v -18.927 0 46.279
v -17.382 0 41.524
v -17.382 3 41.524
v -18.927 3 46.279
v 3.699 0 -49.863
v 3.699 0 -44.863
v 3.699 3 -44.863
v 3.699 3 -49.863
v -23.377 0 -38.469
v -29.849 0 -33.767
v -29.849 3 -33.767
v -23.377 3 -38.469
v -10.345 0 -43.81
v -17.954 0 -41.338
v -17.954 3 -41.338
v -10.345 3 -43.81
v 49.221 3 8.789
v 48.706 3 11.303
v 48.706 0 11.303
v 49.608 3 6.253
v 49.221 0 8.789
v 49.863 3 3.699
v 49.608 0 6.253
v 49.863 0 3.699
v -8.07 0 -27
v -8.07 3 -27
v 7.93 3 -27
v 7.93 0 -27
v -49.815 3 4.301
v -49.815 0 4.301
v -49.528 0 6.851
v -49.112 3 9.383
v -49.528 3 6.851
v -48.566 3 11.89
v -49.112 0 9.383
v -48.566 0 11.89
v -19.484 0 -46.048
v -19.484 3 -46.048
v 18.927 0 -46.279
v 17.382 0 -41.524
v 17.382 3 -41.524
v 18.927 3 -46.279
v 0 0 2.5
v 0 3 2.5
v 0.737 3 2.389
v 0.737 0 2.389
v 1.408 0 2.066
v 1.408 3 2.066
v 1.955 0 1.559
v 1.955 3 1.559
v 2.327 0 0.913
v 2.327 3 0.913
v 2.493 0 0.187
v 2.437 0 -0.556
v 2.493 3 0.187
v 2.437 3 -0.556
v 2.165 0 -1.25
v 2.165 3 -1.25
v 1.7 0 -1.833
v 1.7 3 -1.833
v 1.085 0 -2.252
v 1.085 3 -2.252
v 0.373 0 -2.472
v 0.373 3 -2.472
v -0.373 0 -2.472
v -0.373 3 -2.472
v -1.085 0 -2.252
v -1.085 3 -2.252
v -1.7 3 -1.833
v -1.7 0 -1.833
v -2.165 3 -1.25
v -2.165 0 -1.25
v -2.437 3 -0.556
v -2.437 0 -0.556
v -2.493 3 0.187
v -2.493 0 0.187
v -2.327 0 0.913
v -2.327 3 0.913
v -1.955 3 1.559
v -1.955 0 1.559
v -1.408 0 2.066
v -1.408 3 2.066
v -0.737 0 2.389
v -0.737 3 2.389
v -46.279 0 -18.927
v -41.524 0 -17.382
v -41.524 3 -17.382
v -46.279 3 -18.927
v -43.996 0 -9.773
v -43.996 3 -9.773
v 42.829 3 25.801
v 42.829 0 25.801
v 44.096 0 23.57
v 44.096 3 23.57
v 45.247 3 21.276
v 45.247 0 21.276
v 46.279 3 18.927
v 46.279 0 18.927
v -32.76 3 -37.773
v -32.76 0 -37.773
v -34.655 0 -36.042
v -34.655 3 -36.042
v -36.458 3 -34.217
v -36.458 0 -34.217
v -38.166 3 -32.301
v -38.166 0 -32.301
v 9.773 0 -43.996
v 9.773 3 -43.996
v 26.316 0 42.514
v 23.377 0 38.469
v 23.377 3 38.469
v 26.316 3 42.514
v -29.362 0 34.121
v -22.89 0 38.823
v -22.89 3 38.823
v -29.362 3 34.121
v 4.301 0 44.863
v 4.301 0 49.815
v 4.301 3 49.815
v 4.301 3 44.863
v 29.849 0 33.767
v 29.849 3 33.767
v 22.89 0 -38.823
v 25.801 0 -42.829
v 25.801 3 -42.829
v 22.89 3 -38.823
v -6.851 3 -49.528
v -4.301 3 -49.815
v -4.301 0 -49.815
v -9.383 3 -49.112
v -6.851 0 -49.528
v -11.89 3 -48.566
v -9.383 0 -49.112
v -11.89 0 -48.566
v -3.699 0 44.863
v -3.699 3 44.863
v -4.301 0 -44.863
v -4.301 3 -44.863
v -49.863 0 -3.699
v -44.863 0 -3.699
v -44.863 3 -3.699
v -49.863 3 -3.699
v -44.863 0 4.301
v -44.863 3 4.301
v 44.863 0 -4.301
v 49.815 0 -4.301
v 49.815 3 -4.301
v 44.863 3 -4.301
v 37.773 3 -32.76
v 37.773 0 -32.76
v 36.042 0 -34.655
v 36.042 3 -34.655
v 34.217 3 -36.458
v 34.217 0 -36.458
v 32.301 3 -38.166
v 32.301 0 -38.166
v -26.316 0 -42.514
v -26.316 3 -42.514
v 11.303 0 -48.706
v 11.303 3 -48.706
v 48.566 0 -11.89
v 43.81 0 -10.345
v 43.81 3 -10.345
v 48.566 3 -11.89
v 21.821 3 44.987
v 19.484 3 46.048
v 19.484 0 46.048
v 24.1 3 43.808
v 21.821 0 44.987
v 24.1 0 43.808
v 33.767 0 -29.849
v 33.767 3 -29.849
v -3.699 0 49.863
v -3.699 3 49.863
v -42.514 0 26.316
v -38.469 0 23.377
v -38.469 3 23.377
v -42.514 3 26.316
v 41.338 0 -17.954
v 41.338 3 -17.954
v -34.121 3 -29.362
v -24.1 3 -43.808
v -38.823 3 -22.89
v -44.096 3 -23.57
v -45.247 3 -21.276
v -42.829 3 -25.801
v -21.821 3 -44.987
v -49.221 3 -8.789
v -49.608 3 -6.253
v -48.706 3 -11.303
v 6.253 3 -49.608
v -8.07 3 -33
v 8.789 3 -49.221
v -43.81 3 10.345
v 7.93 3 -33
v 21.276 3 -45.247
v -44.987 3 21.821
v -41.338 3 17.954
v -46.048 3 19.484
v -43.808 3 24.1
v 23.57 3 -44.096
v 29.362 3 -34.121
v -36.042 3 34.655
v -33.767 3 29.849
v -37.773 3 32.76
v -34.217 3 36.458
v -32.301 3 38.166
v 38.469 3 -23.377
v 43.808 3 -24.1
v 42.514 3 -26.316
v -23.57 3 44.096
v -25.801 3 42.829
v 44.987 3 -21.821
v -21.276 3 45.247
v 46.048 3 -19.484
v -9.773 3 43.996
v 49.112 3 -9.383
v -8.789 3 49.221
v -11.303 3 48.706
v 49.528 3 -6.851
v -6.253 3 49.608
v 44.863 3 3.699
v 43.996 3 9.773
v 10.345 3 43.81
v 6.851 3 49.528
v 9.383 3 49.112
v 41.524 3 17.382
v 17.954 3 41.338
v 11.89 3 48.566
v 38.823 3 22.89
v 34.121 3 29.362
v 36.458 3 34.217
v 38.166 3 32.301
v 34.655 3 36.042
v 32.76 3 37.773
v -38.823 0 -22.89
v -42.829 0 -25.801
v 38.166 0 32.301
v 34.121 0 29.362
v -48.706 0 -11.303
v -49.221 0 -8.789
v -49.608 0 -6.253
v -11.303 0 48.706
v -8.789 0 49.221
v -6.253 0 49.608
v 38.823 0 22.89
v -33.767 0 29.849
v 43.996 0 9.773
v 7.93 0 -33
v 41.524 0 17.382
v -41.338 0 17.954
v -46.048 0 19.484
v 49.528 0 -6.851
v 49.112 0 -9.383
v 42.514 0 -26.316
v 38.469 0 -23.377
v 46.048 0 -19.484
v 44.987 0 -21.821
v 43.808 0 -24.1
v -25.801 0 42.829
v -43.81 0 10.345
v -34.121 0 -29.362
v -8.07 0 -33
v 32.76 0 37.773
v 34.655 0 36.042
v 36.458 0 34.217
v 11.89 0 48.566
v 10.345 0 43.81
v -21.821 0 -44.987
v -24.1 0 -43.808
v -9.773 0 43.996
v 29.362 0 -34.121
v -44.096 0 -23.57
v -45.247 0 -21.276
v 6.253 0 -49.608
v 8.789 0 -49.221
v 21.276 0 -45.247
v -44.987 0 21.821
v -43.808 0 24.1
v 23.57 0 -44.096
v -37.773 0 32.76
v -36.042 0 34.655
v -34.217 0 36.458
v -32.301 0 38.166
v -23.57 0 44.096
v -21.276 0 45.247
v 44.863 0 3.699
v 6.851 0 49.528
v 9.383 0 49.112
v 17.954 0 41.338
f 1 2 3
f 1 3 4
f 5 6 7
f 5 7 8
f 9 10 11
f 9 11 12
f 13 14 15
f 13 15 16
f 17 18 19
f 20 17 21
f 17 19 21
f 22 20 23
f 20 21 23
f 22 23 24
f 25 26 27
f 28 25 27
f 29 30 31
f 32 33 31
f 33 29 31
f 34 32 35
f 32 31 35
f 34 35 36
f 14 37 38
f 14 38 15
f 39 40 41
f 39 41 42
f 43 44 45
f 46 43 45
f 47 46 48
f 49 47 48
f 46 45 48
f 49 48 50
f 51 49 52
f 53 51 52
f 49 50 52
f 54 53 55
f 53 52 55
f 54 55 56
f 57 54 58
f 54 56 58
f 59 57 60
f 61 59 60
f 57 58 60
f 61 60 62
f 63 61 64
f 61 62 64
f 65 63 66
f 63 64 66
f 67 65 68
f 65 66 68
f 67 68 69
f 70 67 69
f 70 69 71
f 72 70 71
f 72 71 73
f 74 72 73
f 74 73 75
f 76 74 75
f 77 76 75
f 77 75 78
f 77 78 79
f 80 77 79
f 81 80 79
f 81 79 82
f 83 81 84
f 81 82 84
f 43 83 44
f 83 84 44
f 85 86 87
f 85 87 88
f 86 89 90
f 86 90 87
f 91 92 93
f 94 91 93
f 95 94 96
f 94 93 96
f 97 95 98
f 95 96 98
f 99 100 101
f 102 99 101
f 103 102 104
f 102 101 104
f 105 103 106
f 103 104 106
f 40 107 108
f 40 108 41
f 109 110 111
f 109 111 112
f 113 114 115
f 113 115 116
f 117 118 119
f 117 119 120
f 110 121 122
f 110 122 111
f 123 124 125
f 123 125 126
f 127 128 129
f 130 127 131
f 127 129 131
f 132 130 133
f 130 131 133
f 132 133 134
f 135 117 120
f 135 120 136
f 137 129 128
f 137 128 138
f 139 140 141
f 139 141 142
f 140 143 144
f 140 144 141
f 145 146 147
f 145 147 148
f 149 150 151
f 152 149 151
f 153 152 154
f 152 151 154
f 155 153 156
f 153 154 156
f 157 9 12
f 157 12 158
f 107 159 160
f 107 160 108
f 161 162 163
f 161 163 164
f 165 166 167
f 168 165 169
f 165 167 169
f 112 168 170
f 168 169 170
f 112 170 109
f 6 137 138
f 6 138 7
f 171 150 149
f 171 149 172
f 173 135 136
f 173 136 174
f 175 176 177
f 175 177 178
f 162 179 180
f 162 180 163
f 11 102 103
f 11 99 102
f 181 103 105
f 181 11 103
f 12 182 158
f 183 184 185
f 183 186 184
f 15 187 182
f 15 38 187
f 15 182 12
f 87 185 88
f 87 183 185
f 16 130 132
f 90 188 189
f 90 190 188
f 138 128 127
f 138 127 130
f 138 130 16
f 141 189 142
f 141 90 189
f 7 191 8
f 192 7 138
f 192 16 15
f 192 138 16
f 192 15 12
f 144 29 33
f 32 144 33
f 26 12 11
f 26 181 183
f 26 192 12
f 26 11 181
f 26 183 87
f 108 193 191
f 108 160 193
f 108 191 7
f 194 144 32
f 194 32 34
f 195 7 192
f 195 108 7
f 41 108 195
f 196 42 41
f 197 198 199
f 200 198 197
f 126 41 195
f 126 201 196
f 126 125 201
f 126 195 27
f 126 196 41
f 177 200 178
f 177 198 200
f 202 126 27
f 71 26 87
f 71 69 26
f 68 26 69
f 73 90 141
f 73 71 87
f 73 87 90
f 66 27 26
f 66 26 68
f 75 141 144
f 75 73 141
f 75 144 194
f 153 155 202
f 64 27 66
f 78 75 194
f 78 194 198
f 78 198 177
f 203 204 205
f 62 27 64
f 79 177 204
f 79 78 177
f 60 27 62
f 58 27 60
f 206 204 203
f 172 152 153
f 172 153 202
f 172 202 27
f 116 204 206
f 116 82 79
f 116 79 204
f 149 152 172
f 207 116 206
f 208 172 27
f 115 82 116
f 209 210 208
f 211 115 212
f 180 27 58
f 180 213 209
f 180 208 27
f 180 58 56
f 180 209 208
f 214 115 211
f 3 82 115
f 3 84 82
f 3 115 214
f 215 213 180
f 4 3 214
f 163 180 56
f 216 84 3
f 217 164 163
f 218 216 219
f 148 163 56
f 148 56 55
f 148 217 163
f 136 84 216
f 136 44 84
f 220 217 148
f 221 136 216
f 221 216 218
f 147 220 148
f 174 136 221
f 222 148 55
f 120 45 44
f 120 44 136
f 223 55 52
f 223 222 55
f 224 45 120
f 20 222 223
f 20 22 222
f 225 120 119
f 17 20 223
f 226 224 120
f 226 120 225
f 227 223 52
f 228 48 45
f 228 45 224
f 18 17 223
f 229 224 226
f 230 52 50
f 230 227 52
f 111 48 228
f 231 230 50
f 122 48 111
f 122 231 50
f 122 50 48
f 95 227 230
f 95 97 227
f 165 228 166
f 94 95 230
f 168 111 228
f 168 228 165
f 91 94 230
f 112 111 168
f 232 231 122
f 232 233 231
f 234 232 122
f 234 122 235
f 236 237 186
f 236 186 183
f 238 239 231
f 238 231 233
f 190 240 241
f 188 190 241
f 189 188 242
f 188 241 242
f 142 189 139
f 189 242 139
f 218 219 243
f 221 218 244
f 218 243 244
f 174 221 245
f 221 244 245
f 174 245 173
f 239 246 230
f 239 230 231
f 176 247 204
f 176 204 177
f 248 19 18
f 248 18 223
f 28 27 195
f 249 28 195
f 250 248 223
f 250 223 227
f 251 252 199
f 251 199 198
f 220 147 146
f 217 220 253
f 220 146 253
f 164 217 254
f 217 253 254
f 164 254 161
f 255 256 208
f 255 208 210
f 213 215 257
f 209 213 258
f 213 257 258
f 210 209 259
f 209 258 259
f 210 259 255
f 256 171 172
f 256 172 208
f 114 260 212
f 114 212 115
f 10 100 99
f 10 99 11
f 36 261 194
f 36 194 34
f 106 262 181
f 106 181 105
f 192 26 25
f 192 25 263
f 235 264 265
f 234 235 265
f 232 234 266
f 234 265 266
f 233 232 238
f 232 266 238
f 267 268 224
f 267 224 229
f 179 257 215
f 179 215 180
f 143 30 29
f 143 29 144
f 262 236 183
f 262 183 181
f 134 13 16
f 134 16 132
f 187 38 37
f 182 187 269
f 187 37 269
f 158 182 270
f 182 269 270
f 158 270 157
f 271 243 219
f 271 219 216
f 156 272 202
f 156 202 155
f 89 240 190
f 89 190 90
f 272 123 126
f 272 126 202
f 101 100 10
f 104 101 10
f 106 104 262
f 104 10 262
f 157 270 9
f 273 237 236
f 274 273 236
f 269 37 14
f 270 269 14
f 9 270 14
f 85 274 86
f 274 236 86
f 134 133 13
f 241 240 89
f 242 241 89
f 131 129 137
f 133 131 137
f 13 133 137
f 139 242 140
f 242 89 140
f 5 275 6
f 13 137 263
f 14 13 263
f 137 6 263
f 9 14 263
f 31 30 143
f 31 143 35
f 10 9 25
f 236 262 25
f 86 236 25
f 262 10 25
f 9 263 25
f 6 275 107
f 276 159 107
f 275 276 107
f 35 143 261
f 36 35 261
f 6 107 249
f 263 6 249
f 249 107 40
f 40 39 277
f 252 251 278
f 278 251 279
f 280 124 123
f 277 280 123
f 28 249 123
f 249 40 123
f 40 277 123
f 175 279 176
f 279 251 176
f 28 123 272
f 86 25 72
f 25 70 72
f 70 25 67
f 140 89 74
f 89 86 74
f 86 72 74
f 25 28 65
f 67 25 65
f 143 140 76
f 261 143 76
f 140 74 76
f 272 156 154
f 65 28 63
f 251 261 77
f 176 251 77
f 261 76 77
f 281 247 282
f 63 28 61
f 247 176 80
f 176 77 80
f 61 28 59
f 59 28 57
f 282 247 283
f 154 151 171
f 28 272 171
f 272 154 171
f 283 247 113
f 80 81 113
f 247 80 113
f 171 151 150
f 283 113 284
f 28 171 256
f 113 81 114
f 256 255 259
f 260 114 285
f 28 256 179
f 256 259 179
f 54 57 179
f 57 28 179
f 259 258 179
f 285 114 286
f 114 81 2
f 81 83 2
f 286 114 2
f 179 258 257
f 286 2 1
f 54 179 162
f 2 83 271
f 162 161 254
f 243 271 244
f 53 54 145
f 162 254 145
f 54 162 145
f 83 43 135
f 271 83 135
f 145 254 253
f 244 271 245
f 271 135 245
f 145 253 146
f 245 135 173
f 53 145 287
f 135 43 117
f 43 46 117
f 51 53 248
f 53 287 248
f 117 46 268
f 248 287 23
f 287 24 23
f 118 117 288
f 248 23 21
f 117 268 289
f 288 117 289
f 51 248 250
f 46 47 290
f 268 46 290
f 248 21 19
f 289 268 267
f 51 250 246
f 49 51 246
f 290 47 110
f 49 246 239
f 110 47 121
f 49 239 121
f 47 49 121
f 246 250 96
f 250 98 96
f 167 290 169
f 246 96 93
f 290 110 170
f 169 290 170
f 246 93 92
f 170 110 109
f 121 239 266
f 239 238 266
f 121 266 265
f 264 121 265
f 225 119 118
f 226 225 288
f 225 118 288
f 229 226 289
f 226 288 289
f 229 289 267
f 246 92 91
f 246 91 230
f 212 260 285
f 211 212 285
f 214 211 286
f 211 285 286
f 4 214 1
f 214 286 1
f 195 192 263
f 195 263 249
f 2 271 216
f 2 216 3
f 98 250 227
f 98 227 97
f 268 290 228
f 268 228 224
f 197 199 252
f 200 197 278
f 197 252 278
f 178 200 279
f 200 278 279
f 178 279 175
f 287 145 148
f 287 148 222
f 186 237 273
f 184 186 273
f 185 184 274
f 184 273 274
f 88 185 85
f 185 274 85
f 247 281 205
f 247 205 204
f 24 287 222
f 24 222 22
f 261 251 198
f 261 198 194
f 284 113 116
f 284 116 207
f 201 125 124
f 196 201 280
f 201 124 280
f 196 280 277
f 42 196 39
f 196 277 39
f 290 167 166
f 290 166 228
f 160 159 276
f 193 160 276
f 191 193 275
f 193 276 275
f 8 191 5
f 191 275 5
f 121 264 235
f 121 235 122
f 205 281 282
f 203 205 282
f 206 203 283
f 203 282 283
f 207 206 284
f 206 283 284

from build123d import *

# Parameters (mm, degrees)
SKETCH1_R           = 50
BOSS_EXTRUDE3_DEPTH = 3
SKETCH7_R           = 2.5
CUT_EXTRUDE1_DEPTH  = 3
CUT_EXTRUDE4_START  = -3
CUT_EXTRUDE4_DEPTH  = 74.774289117
CIRPATTERN5_COUNT   = 20
SKETCH9_W           = 16
SKETCH9_H           = 6
CUT_EXTRUDE5_DEPTH  = 3


with BuildPart() as part:
    # Sketch1 → Boss-Extrude3 (new body)
    with BuildSketch(Plane(origin=(0, 0, 0), x_dir=(1, 0, 0), z_dir=(0, 1, 0))):
        with Locations(Location((0, 0, 0), (0, 0, 270))):
            Circle(SKETCH1_R)
    extrude(amount=BOSS_EXTRUDE3_DEPTH)

    # Sketch7 → Cut-Extrude1 (cut)
    with BuildSketch(Plane(origin=(0, 3, 0), x_dir=(1, 0, 0), z_dir=(0, 1, 0))):
        with Locations(Location((0, 0, 0), (0, 0, 270))):
            Circle(SKETCH7_R)
    extrude(amount=-CUT_EXTRUDE1_DEPTH, mode=Mode.SUBTRACT)

    # Sketch8 → Cut-Extrude4 (cut)
    with BuildSketch(Plane(origin=(0, 3, 0), x_dir=(1, 0, 0), z_dir=(0, 1, 0)).offset(CUT_EXTRUDE4_START)):
        Polygon((-4.300866829, 287.072728165), (-4.300866829, 49.814682018), (-4.300866829, 44.862976383), (3.699133171, 44.862976383), (3.699133171, 49.862976383), (3.699133171, 287.12102253), (0.83462867, 761.628468689), (-7.16537133, 761.580174324), align=None)
    cut_extrude4 = extrude(amount=CUT_EXTRUDE4_DEPTH, mode=Mode.SUBTRACT)

    # CirPattern5: Cut-Extrude4 ×20 about axis
    cirpattern5_axis = Axis((0, 3, 0), (0, 1, 0))
    for i in range(1, CIRPATTERN5_COUNT):
        add(cut_extrude4.rotate(cirpattern5_axis, i * 360 / CIRPATTERN5_COUNT), mode=Mode.SUBTRACT)

    # Sketch9 → Cut-Extrude5 (cut)
    with BuildSketch(Plane(origin=(0, 3, 0), x_dir=(1, 0, 0), z_dir=(0, 1, 0))):
        with Locations((-0.069626974, 30)):
            Rectangle(SKETCH9_W, SKETCH9_H)
    extrude(amount=-CUT_EXTRUDE5_DEPTH, mode=Mode.SUBTRACT)


solid = part.part
